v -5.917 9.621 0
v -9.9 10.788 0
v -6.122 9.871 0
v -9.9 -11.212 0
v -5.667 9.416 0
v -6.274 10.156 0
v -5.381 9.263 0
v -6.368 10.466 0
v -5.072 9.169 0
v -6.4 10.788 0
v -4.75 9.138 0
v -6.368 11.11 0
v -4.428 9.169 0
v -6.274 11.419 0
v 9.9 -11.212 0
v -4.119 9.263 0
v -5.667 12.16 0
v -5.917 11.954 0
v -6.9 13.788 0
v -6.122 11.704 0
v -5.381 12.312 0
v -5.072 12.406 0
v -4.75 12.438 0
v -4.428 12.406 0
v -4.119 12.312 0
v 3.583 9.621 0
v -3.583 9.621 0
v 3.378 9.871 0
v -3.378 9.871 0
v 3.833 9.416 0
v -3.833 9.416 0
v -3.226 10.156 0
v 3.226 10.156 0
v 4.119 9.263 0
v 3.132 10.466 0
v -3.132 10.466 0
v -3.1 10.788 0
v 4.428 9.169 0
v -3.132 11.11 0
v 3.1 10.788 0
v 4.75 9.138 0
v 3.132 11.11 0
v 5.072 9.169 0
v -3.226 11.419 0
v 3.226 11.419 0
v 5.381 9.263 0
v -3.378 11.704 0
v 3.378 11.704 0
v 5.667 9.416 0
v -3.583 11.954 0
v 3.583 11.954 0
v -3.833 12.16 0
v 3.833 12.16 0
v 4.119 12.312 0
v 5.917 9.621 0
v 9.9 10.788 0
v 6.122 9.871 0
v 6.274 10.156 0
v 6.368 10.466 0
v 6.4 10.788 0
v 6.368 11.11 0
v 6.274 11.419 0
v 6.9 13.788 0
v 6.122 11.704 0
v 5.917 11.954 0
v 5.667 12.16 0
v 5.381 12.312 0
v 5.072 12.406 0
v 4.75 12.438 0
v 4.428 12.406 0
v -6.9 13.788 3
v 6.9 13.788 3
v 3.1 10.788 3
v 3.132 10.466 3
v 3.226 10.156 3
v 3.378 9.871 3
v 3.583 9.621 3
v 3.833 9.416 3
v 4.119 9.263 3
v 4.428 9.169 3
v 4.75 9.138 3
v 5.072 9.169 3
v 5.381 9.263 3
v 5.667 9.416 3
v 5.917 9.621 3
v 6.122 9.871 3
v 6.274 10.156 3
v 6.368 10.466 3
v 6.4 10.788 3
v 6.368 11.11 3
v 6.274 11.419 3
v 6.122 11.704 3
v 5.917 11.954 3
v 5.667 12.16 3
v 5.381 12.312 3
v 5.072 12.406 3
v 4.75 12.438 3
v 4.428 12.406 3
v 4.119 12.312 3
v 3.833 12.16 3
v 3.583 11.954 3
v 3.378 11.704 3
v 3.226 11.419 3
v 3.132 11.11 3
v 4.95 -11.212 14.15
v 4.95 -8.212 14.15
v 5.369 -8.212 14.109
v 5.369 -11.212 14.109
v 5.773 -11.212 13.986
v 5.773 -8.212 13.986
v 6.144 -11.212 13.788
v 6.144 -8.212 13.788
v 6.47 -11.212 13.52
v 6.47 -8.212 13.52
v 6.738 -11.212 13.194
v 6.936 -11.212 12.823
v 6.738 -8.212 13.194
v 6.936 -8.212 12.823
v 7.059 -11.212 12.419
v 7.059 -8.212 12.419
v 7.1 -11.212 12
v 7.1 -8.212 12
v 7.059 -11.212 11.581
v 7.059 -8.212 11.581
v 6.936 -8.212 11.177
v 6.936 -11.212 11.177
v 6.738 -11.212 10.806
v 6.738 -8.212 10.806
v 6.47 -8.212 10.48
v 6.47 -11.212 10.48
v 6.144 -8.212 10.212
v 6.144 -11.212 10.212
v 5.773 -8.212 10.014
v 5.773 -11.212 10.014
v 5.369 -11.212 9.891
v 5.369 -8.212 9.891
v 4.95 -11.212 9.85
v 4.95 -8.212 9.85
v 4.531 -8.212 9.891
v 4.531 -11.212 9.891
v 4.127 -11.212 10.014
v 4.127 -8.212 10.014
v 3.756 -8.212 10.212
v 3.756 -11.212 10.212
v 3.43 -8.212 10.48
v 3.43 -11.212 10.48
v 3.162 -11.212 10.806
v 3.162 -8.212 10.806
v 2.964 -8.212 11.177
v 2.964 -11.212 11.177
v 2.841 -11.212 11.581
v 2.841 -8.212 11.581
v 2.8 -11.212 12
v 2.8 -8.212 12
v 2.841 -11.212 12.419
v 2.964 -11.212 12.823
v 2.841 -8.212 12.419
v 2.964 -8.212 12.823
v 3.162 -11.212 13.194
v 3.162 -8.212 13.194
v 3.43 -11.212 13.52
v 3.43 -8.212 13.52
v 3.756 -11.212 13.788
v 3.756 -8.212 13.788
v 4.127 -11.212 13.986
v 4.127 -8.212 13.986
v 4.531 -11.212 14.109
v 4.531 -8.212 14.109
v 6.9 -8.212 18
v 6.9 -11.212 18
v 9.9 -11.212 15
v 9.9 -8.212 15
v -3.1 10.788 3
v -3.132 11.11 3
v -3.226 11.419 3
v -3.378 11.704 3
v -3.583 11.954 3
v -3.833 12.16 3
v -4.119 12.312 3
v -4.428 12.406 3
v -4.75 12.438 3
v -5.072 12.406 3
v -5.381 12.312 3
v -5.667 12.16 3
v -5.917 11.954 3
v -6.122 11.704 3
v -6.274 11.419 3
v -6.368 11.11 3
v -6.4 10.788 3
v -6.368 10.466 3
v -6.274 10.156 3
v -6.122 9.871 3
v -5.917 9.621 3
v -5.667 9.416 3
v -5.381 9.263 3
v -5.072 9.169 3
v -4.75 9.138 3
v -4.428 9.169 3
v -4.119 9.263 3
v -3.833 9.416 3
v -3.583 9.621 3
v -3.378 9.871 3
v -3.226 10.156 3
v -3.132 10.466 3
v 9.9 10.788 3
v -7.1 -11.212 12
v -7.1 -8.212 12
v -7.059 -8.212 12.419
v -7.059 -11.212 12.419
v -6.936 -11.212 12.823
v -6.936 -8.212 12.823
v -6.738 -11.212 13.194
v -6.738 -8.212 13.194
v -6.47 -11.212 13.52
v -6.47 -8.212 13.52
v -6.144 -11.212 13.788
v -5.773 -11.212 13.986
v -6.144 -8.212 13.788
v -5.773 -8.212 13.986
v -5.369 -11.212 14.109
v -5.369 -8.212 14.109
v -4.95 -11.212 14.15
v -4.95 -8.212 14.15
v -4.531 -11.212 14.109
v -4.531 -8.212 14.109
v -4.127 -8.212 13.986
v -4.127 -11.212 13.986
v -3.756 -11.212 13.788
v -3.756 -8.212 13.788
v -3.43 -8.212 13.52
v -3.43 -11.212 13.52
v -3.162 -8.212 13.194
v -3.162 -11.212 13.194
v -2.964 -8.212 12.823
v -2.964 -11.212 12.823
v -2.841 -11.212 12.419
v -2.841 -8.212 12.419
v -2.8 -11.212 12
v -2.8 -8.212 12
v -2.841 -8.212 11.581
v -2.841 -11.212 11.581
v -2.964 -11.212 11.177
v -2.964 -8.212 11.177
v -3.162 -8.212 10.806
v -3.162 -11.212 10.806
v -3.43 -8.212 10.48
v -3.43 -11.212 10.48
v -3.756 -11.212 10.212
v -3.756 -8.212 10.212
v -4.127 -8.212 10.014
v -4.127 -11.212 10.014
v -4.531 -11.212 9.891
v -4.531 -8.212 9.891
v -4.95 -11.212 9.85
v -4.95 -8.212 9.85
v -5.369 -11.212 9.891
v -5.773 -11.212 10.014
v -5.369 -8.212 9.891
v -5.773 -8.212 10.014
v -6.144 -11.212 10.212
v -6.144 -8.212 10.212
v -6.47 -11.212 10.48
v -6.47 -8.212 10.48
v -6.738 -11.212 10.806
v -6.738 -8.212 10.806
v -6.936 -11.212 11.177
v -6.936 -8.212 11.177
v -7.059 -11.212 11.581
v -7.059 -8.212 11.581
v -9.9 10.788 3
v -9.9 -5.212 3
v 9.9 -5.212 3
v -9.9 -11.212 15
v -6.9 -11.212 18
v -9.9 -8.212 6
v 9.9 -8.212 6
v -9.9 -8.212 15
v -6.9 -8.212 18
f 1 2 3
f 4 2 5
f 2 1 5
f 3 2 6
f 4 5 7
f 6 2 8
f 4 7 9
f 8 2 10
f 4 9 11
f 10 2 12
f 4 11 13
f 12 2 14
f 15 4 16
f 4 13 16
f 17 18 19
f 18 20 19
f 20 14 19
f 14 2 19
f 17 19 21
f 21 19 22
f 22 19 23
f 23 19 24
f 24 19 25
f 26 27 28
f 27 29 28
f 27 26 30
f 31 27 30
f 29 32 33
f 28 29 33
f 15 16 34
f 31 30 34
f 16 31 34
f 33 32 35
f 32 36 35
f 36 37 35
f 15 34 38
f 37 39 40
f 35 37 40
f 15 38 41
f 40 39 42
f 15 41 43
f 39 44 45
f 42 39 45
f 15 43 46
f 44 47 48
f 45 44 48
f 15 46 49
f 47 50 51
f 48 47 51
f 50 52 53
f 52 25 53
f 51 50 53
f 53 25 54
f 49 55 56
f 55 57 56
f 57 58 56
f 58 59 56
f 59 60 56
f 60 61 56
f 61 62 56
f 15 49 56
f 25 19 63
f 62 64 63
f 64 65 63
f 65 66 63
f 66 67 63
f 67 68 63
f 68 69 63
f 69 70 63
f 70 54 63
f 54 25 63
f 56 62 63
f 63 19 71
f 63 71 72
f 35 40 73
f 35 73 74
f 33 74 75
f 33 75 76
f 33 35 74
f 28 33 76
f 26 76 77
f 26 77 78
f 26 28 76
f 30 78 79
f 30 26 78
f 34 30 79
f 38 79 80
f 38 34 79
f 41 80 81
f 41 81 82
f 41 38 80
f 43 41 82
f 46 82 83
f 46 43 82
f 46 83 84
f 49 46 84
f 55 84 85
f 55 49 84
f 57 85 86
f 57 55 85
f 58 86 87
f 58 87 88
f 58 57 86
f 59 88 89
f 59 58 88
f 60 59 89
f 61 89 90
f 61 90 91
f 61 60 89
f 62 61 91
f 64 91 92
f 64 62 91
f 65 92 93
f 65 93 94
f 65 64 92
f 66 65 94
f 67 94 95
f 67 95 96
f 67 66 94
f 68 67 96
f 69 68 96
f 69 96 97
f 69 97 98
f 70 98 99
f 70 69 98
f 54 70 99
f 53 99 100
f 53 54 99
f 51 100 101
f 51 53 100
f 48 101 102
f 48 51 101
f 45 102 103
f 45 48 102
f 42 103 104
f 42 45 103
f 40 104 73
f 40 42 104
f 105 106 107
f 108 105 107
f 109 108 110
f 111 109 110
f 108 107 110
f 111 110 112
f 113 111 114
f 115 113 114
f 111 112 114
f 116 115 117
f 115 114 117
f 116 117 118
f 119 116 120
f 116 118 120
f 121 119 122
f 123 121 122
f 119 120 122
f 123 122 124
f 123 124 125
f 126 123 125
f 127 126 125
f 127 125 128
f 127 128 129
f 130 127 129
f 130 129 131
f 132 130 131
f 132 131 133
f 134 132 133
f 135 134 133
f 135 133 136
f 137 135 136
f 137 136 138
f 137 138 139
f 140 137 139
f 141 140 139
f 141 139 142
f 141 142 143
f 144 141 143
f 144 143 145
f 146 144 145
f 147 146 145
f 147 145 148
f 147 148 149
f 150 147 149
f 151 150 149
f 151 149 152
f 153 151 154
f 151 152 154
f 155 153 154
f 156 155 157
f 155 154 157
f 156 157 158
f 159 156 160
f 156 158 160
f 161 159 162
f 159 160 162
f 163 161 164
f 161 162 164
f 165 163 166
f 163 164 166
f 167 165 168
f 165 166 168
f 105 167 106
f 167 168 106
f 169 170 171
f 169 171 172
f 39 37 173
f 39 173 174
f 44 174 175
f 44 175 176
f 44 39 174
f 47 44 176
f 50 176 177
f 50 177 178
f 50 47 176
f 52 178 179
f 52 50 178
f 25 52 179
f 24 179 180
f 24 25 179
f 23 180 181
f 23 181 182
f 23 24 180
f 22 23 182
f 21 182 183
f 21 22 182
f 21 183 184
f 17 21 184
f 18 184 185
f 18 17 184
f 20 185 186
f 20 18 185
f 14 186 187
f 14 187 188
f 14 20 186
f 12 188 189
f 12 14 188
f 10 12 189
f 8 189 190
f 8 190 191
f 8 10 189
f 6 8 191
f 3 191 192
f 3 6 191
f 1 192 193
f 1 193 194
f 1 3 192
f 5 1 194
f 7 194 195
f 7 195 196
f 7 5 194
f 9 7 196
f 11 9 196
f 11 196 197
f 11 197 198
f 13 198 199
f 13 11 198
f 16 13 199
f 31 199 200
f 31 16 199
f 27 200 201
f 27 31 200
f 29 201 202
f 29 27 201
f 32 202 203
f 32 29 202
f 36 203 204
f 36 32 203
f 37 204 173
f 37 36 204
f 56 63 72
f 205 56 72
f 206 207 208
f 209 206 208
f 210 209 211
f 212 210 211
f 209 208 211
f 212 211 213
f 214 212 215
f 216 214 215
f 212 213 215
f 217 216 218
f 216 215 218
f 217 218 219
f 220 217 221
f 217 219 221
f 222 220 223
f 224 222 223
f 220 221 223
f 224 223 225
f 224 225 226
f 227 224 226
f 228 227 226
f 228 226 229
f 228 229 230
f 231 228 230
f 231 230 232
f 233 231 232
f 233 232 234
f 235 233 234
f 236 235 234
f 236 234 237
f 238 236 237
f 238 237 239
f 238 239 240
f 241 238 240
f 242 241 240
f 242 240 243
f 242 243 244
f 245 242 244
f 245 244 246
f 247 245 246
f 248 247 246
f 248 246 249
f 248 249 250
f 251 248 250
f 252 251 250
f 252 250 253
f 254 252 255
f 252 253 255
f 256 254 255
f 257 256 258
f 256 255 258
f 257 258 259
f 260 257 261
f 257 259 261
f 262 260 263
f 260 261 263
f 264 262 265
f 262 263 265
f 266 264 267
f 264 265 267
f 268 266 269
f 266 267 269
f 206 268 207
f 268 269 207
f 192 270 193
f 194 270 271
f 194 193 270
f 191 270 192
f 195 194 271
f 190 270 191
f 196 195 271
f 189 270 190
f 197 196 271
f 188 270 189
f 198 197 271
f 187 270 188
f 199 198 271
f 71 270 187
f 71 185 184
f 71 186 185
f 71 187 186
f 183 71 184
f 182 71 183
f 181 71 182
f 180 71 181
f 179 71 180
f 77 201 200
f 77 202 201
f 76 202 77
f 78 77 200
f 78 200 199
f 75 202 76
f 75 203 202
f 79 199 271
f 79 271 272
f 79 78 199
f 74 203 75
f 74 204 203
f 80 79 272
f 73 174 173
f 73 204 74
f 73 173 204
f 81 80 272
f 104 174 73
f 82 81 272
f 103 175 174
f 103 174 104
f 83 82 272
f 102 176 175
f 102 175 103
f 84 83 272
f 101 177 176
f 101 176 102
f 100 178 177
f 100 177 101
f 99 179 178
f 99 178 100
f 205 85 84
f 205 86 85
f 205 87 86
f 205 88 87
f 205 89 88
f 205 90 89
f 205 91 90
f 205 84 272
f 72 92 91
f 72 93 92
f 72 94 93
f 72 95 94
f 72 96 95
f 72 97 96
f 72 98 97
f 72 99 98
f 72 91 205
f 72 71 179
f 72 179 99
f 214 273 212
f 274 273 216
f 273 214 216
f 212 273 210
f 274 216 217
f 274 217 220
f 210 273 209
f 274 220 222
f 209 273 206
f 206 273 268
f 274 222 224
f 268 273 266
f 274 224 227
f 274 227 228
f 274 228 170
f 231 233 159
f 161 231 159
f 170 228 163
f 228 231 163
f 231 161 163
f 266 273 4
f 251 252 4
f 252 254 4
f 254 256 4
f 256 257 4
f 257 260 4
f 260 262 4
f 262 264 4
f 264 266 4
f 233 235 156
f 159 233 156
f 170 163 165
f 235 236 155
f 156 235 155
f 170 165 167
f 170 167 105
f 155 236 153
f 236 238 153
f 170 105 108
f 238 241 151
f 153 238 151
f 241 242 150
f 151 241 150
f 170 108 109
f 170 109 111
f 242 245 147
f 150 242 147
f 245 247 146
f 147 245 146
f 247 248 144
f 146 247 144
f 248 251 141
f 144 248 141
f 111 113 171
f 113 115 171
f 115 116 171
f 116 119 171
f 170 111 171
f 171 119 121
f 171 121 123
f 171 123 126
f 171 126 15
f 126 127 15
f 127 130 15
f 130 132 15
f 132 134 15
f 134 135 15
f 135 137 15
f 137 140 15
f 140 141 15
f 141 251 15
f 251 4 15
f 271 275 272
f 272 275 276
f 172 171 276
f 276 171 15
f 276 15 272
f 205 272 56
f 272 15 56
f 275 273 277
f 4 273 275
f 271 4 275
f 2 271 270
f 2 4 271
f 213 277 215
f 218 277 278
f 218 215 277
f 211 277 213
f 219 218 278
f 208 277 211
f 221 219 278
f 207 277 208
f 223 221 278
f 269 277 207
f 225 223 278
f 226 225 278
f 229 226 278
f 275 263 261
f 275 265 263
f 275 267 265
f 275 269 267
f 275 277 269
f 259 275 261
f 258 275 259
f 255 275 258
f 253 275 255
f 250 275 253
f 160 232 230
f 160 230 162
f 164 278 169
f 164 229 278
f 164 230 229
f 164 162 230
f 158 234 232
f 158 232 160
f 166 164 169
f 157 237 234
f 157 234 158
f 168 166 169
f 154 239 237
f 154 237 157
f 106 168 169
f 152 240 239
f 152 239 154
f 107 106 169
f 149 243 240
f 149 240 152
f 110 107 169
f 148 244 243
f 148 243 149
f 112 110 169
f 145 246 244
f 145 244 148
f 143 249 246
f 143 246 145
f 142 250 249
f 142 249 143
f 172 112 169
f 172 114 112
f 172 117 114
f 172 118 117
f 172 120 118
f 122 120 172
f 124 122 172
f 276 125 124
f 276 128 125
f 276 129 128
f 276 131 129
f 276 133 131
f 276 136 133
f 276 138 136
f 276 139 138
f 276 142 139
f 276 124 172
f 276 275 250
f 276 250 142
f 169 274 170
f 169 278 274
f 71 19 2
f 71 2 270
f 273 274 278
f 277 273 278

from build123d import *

# Parameters (mm, degrees)
SKETCH1_W           = 19.8
SKETCH1_H           = 25
SKETCH1_R           = 1.65
BOSS_EXTRUDE1_DEPTH = 3
SKETCH2_W           = 19.8
SKETCH2_H           = 3
BOSS_EXTRUDE2_DEPTH = 15
CHAMFER1_SIZE       = 3
SKETCH4_R           = 2.15
CUT_EXTRUDE1_DEPTH  = 15
CHAMFER2_SIZE       = 3


with BuildPart() as part:
    # Sketch1 → Boss-Extrude1 (new body)
    with BuildSketch(Plane.XY):
        with Locations((0, 1.287671233)):
            Rectangle(SKETCH1_W, SKETCH1_H)
        with Locations((-4.75, 10.787671233)):
            Circle(SKETCH1_R, mode=Mode.SUBTRACT)
        with Locations(Location((4.75, 10.787671233, 0), (0, 0, 180))):
            Circle(SKETCH1_R, mode=Mode.SUBTRACT)
    extrude(amount=BOSS_EXTRUDE1_DEPTH)

    # Sketch2 → Boss-Extrude2 (add)
    with BuildSketch(Plane.XY.offset(3)):
        with Locations((0, -9.712328767)):
            Rectangle(SKETCH2_W, SKETCH2_H)
    extrude(amount=BOSS_EXTRUDE2_DEPTH)

    # Chamfer1
    chamfer1_edges = [part.edges().sort_by_distance(p)[0] for p in [
        (0, -8.212328767, 3),
        (-9.9, 13.787671233, 1.5),
        (9.9, 13.787671233, 1.5),
    ]]
    chamfer(chamfer1_edges, length=CHAMFER1_SIZE)

    # Sketch4 → Cut-Extrude1 (cut)
    with BuildSketch(Plane(origin=(0, -8.212328767, 0), x_dir=(1, 0, 0), z_dir=(0, 1, 0))):
        with Locations(Location((4.95, -12, 0), (0, 0, 270))):
            Circle(SKETCH4_R)
        with Locations(Location((-4.95, -12, 0), (0, 0, 180))):
            Circle(SKETCH4_R)
    extrude(amount=-CUT_EXTRUDE1_DEPTH, mode=Mode.SUBTRACT)

    # Chamfer2
    chamfer2_edges = [part.edges().sort_by_distance(p)[0] for p in [
        (-9.9, -9.712328767, 18),
        (9.9, -9.712328767, 18),
    ]]
    chamfer(chamfer2_edges, length=CHAMFER2_SIZE)


solid = part.part
